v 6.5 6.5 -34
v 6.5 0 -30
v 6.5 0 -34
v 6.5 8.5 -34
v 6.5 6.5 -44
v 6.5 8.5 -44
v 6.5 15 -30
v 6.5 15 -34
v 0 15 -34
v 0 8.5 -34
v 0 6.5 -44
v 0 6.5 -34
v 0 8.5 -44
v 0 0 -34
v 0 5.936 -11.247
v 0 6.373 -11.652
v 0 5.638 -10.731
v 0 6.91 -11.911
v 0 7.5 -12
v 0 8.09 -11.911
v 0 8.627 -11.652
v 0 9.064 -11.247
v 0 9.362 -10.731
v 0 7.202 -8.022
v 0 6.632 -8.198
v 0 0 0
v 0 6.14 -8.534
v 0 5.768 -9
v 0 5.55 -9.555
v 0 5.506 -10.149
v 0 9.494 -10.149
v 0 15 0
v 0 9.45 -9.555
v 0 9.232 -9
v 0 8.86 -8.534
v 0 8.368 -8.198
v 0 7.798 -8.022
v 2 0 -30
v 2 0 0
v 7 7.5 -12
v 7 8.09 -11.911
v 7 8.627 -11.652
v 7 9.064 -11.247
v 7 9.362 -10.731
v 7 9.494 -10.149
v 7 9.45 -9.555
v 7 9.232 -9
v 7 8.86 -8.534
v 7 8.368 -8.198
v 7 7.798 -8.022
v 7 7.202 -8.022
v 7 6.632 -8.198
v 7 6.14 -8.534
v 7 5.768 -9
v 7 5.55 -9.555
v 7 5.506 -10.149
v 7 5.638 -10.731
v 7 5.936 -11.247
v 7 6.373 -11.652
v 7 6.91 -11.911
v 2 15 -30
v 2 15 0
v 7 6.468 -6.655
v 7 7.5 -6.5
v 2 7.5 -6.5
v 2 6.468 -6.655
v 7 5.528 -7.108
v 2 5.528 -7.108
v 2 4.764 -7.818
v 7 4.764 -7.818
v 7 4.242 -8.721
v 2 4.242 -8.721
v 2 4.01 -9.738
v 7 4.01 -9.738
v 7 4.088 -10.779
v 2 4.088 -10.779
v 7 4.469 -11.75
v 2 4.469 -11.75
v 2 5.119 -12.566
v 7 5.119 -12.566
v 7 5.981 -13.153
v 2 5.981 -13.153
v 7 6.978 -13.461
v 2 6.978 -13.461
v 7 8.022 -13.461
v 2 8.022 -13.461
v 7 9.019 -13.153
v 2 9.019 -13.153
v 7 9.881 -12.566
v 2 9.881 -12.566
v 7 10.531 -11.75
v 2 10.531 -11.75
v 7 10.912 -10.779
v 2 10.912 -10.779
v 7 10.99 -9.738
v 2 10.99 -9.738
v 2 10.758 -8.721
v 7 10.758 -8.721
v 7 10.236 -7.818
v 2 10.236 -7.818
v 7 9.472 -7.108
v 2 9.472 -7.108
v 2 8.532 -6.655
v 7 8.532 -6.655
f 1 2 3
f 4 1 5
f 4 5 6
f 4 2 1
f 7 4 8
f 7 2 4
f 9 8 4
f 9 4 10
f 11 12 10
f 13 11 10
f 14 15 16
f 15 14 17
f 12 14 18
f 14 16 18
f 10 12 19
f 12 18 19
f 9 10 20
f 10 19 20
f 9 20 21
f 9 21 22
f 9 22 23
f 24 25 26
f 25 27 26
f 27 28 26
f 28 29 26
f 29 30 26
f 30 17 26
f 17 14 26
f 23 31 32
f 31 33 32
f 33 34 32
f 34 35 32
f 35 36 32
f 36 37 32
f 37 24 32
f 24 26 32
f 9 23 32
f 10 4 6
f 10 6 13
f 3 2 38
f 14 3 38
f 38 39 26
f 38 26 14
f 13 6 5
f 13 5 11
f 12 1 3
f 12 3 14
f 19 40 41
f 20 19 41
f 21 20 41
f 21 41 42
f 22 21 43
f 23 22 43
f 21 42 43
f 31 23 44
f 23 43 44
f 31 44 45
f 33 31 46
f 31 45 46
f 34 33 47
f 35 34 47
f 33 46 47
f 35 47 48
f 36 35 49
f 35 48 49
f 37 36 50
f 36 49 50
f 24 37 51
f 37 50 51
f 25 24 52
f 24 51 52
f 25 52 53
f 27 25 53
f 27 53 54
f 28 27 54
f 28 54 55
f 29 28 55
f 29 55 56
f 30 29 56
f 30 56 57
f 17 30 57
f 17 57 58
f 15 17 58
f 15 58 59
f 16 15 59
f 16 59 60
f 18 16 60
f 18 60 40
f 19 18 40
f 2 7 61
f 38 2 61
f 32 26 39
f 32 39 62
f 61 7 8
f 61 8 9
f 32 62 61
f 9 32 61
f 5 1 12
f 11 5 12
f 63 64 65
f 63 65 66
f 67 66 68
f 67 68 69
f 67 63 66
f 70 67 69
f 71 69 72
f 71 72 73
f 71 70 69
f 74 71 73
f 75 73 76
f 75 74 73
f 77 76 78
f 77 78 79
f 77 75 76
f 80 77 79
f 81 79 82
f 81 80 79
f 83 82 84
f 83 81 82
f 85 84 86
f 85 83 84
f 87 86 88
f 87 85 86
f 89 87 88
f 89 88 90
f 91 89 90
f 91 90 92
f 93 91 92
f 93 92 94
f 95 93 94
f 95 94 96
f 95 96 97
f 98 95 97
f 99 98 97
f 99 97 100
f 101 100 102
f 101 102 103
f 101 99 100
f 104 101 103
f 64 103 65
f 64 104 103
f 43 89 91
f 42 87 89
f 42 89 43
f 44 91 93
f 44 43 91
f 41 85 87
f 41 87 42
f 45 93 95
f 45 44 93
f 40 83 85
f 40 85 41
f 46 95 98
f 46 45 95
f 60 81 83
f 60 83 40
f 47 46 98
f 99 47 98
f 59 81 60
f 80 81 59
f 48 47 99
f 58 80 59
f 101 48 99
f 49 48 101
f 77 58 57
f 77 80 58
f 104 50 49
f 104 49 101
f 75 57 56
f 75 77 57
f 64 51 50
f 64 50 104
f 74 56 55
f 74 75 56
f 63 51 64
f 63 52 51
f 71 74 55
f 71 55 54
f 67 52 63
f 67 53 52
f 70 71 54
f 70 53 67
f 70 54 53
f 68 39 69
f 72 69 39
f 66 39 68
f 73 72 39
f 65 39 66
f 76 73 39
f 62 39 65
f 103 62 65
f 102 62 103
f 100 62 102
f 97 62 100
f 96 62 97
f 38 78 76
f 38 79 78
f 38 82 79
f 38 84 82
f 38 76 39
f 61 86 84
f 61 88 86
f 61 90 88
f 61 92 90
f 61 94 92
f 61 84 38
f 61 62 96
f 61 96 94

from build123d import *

# Parameters (mm, degrees)
SKETCH1_W           = 30
SKETCH1_H           = 15
BOSS_EXTRUDE1_DEPTH = 2
SKETCH2_W           = 6.5
SKETCH2_H           = 15
BOSS_EXTRUDE2_DEPTH = 4
SKETCH3_W           = 6.5
SKETCH3_H           = 2
BOSS_EXTRUDE3_DEPTH = 10
SKETCH4_R           = 2
CUT_EXTRUDE2_DEPTH  = 5
BOSS_EXTRUDE4_START = 5
SKETCH5_R           = 3.5
SKETCH5_R_2         = 2
BOSS_EXTRUDE4_DEPTH = 5


with BuildPart() as part:
    # Sketch1 → Boss-Extrude1 (new body)
    with BuildSketch(Plane(origin=(0, 0, 0), x_dir=(0, 0, -1), z_dir=(1, 0, 0))):
        with Locations((15, 7.5)):
            Rectangle(SKETCH1_W, SKETCH1_H)
    extrude(amount=BOSS_EXTRUDE1_DEPTH)

    # Sketch2 → Boss-Extrude2 (add)
    with BuildSketch(Plane(origin=(0, 0, -30), x_dir=(-1, 0, 0), z_dir=(0, 0, -1))):
        with Locations((-3.25, 7.5)):
            Rectangle(SKETCH2_W, SKETCH2_H)
    extrude(amount=BOSS_EXTRUDE2_DEPTH)

    # Sketch3 → Boss-Extrude3 (add)
    with BuildSketch(Plane(origin=(0, 0, -34), x_dir=(-1, 0, 0), z_dir=(0, 0, -1))):
        with Locations((-3.25, 7.5)):
            Rectangle(SKETCH3_W, SKETCH3_H)
    extrude(amount=BOSS_EXTRUDE3_DEPTH)

    # Sketch4 → Cut-Extrude2 (cut)
    with BuildSketch(Plane(origin=(2, 0, 0), x_dir=(0, 0, -1), z_dir=(1, 0, 0))):
        with Locations((10, 7.5)):
            Circle(SKETCH4_R)
    extrude(amount=-CUT_EXTRUDE2_DEPTH, mode=Mode.SUBTRACT)

    # Sketch5 → Boss-Extrude4 (add)
    with BuildSketch(Plane(origin=(2, 0, 0), x_dir=(0, 0, -1), z_dir=(1, 0, 0)).offset(BOSS_EXTRUDE4_START)):
        with Locations(Location((10, 7.5, 0), (0, 0, 180))):
            Circle(SKETCH5_R)
        with Locations((10, 7.5)):
            Circle(SKETCH5_R_2, mode=Mode.SUBTRACT)
    extrude(amount=-BOSS_EXTRUDE4_DEPTH)


solid = part.part
